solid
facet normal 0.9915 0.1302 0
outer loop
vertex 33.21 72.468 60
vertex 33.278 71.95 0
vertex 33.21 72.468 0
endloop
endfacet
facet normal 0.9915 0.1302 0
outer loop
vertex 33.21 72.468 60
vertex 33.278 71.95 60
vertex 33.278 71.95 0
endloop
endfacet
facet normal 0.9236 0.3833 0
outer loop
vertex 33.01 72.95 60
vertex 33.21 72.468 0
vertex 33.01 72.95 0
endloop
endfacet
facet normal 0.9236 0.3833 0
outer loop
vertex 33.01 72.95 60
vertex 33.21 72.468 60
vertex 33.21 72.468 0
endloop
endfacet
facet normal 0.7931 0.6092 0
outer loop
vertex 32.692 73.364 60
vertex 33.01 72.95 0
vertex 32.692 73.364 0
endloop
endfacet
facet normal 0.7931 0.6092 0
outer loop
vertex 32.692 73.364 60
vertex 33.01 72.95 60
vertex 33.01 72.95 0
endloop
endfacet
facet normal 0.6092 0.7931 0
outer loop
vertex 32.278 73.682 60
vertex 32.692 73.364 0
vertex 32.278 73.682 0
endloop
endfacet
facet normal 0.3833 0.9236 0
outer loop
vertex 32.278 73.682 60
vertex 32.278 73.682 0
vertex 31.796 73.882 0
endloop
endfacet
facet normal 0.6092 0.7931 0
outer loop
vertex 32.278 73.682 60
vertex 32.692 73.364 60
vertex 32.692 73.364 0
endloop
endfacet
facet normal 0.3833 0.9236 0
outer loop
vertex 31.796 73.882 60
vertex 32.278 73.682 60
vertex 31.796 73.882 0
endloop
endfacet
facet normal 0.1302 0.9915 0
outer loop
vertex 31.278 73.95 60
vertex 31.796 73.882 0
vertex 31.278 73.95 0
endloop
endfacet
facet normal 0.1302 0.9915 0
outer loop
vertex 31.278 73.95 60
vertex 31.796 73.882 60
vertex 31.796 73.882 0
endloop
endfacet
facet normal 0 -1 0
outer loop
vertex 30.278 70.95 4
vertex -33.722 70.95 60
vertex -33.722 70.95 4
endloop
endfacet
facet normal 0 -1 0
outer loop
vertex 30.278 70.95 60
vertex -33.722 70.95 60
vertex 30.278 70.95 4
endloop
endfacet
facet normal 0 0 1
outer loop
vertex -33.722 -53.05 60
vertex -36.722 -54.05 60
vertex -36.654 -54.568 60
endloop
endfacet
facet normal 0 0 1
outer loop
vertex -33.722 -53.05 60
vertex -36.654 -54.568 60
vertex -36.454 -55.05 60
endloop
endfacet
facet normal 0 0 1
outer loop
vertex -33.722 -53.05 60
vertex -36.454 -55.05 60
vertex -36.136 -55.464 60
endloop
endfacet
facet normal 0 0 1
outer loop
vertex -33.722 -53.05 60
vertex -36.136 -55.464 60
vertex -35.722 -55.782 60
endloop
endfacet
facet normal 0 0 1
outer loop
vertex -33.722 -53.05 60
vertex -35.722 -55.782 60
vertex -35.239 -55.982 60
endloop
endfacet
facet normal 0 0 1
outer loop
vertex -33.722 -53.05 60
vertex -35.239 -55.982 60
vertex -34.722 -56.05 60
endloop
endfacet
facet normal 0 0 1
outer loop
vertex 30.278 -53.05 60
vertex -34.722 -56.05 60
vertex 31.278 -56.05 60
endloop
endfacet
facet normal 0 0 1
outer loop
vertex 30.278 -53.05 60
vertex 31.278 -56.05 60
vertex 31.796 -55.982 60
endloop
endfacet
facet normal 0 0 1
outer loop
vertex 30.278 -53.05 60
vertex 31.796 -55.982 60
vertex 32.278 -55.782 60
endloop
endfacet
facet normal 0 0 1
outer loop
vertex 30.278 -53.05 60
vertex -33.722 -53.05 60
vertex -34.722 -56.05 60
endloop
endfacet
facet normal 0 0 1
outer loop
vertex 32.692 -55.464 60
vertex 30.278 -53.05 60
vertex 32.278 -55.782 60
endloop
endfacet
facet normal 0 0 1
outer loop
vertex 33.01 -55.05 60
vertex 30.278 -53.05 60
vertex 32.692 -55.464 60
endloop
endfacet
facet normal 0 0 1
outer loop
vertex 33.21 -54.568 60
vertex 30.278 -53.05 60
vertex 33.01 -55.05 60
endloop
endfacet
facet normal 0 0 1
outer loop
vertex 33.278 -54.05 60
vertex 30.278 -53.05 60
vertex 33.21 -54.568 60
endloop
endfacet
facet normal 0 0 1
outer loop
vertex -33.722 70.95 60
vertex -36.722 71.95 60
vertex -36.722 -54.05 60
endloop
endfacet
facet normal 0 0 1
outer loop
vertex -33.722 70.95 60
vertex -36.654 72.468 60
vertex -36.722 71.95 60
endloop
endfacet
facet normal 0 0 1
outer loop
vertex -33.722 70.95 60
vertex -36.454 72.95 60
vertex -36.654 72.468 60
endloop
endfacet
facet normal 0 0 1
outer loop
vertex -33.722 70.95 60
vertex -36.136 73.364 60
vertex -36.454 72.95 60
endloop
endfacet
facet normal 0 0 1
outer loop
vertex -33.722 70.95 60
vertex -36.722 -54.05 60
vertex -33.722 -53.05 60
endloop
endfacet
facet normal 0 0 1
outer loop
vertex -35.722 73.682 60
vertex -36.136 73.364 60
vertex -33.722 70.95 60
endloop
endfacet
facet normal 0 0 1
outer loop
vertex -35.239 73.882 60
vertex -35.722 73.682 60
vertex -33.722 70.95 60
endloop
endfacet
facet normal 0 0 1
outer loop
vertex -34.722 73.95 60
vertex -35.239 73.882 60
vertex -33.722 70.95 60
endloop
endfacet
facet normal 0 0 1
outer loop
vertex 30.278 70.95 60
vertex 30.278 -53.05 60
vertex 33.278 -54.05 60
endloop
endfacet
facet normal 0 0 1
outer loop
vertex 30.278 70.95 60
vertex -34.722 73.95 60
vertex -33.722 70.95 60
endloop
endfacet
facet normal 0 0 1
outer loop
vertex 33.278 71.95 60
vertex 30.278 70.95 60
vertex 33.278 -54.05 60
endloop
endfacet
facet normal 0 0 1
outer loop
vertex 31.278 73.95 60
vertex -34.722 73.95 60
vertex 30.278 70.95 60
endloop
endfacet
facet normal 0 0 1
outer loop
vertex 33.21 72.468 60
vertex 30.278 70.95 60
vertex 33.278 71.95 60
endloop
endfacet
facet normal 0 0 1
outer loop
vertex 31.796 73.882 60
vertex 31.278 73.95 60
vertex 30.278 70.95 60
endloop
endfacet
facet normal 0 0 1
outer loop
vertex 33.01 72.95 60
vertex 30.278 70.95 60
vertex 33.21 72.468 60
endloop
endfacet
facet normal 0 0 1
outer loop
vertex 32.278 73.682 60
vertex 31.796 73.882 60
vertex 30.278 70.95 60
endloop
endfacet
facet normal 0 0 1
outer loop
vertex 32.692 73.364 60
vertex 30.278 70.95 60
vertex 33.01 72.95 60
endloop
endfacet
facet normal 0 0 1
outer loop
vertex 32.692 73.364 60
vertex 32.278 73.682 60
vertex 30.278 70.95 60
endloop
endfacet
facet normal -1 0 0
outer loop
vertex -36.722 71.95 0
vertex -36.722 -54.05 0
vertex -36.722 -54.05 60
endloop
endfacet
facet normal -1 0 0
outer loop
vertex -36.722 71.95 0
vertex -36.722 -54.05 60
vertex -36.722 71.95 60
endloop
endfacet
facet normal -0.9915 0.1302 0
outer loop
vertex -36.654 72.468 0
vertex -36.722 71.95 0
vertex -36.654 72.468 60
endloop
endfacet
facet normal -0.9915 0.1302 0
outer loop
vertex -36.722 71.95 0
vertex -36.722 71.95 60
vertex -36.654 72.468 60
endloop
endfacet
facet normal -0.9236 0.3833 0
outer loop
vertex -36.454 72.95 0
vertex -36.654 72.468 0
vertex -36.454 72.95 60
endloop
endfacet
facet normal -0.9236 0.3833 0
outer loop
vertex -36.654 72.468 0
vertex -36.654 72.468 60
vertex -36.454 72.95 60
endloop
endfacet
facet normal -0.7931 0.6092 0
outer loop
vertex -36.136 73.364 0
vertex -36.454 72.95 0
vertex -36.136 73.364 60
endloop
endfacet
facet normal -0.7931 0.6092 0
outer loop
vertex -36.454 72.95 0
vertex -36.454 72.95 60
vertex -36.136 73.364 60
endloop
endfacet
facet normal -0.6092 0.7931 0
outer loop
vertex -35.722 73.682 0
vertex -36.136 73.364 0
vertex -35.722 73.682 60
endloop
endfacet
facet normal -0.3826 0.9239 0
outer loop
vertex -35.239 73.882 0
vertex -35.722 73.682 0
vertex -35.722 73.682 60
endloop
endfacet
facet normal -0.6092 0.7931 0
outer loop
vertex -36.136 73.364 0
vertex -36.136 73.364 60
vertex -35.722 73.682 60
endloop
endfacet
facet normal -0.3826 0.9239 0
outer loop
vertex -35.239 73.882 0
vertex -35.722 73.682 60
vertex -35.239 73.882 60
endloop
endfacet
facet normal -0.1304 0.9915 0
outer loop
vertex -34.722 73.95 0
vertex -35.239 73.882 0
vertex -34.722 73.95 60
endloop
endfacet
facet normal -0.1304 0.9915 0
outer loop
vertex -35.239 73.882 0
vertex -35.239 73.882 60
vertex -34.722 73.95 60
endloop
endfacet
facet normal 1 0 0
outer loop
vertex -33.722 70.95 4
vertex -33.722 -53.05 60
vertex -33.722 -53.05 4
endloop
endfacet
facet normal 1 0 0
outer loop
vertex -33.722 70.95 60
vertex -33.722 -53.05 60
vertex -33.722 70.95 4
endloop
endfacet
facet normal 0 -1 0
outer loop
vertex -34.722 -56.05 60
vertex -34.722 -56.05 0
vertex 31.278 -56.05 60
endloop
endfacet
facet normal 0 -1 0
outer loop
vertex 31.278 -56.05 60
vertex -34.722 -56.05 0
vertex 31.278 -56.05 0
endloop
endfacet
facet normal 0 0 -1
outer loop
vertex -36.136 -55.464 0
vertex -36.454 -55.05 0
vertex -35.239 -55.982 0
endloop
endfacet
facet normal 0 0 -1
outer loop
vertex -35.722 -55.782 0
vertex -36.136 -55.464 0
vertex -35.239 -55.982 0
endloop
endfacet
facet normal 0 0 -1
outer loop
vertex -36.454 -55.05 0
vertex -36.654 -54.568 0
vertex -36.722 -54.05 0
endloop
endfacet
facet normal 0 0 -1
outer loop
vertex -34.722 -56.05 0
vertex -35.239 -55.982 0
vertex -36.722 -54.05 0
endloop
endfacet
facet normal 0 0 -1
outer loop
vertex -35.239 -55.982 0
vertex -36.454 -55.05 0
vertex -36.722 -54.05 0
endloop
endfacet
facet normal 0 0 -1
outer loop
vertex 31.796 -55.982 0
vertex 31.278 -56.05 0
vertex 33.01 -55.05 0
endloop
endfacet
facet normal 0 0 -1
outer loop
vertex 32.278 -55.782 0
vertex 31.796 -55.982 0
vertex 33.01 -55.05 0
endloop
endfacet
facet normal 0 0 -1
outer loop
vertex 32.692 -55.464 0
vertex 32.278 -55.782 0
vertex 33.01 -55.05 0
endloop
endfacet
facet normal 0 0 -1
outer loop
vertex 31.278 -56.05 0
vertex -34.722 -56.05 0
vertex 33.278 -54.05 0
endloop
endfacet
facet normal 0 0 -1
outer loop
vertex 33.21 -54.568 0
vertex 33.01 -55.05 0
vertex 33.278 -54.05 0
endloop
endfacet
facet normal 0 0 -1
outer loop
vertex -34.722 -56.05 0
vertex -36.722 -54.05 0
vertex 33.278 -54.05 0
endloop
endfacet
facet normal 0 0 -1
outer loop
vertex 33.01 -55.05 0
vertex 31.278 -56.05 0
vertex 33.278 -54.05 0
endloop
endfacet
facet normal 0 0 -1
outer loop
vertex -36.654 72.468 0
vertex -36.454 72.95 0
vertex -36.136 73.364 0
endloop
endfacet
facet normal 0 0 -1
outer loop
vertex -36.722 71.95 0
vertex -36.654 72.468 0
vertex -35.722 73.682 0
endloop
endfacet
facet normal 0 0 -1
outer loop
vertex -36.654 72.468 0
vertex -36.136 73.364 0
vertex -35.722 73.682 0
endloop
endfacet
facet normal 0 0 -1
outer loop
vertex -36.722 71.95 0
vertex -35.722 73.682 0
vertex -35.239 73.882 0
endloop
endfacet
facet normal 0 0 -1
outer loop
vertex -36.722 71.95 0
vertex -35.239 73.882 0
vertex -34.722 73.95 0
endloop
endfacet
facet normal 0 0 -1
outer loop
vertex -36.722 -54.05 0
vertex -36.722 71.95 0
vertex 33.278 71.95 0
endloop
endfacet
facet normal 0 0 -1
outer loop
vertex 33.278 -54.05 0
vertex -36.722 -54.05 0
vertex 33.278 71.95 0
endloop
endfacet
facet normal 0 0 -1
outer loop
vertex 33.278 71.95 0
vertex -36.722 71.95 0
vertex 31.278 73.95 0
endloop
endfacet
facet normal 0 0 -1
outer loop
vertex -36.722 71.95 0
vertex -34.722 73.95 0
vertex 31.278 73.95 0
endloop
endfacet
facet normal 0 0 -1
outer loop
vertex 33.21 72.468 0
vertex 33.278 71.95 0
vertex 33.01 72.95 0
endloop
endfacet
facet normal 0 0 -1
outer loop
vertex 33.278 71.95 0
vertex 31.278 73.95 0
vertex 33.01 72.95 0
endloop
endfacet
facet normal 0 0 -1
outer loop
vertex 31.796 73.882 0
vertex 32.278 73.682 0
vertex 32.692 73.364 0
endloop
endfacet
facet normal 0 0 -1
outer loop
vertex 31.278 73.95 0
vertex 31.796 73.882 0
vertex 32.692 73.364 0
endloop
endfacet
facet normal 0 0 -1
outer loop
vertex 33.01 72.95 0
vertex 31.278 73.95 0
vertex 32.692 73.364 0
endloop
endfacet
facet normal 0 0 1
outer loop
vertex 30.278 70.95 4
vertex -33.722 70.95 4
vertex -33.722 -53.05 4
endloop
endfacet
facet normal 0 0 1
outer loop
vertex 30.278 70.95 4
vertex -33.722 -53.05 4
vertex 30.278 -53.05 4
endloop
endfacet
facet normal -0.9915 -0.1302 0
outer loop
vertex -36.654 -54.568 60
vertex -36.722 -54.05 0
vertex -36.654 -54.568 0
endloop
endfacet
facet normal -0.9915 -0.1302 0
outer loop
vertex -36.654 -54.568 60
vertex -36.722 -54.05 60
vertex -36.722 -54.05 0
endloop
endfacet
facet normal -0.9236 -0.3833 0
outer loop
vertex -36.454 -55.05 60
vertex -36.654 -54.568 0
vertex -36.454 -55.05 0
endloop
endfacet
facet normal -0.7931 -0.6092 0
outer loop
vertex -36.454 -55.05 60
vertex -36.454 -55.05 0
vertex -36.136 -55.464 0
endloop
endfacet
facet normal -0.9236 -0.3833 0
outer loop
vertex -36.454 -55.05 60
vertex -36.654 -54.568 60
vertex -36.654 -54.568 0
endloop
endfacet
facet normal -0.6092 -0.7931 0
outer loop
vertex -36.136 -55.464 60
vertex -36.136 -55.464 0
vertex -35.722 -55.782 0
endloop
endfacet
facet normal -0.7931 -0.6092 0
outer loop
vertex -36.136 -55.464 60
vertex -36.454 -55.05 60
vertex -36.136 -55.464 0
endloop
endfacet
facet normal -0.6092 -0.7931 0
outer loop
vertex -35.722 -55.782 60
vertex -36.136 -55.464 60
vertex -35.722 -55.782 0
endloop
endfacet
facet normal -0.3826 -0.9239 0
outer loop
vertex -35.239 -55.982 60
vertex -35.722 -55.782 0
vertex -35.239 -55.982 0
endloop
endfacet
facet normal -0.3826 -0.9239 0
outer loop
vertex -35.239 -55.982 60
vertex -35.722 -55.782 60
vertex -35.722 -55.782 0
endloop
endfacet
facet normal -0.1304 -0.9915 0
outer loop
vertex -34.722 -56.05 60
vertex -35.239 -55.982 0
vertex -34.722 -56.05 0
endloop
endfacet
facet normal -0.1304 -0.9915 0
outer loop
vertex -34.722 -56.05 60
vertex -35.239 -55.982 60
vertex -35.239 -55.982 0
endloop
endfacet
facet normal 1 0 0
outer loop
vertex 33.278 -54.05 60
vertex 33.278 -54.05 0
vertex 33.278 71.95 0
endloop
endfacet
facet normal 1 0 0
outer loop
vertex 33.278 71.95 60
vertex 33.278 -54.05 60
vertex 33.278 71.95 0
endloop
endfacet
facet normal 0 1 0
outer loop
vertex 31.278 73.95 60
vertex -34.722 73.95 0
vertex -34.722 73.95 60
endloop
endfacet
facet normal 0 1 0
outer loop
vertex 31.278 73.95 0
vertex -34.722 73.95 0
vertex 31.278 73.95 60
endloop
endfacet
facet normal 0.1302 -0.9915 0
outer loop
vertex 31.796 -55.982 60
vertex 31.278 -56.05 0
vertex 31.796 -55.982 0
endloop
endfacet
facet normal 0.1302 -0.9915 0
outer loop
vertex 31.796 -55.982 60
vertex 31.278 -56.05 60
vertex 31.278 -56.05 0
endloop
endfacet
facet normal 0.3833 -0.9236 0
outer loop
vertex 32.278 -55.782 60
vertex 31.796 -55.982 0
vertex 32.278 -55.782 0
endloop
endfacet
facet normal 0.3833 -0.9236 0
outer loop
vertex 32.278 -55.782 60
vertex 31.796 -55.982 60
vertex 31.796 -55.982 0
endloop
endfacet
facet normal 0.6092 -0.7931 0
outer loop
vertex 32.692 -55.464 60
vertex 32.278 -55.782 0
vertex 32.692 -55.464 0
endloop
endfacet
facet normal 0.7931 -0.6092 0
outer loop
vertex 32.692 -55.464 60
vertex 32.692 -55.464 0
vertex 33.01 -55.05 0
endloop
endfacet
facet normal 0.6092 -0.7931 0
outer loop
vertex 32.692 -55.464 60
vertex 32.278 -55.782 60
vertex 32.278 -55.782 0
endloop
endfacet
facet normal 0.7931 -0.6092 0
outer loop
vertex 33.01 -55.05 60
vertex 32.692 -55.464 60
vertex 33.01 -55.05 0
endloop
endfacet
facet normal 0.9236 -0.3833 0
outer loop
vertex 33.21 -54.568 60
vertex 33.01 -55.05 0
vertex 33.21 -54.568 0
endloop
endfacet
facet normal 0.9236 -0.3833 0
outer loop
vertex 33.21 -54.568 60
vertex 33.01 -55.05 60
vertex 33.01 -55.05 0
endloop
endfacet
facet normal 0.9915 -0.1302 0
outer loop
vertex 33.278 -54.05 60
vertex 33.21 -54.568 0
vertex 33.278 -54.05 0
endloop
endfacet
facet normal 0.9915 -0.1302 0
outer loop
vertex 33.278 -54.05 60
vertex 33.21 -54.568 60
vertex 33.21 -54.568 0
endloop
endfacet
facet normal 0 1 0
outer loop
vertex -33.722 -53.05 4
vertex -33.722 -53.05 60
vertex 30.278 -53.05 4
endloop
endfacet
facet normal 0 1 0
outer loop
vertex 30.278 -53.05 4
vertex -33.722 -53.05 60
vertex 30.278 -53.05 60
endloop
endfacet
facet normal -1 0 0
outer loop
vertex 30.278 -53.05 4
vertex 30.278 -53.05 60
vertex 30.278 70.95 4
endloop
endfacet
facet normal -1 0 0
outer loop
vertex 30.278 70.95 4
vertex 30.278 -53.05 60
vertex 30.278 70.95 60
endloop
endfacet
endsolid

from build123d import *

# Parameters (mm, degrees)
F0_W     = 70
F0_H     = 130
F1_DEPTH = 60
F2_R     = 2
F3_W     = 64
F3_H     = 124
F4_DEPTH = 56


with BuildPart() as f1:
    # F0 (on Top) → F1 (new body)
    with BuildSketch(Plane.XY):
        with Locations((-1.721807, 8.950054)):
            Rectangle(F0_W, F0_H)
    extrude(amount=F1_DEPTH)

    # F2
    f2_edges = [f1.edges().sort_by_distance(p)[0] for p in [
        (33.278193, 73.950054, 30),
        (33.278193, -56.049946, 30),
        (-36.721807, 73.950054, 30),
        (-36.721807, -56.049946, 30),
    ]]
    fillet(f2_edges, radius=F2_R)

    # F3 (on face) → F4 (cut)
    with BuildSketch(Plane.XY.offset(60)):
        with Locations((-1.721807, 8.950054)):
            Rectangle(F3_W, F3_H)
    extrude(amount=-F4_DEPTH, mode=Mode.SUBTRACT)


solid = f1.part
